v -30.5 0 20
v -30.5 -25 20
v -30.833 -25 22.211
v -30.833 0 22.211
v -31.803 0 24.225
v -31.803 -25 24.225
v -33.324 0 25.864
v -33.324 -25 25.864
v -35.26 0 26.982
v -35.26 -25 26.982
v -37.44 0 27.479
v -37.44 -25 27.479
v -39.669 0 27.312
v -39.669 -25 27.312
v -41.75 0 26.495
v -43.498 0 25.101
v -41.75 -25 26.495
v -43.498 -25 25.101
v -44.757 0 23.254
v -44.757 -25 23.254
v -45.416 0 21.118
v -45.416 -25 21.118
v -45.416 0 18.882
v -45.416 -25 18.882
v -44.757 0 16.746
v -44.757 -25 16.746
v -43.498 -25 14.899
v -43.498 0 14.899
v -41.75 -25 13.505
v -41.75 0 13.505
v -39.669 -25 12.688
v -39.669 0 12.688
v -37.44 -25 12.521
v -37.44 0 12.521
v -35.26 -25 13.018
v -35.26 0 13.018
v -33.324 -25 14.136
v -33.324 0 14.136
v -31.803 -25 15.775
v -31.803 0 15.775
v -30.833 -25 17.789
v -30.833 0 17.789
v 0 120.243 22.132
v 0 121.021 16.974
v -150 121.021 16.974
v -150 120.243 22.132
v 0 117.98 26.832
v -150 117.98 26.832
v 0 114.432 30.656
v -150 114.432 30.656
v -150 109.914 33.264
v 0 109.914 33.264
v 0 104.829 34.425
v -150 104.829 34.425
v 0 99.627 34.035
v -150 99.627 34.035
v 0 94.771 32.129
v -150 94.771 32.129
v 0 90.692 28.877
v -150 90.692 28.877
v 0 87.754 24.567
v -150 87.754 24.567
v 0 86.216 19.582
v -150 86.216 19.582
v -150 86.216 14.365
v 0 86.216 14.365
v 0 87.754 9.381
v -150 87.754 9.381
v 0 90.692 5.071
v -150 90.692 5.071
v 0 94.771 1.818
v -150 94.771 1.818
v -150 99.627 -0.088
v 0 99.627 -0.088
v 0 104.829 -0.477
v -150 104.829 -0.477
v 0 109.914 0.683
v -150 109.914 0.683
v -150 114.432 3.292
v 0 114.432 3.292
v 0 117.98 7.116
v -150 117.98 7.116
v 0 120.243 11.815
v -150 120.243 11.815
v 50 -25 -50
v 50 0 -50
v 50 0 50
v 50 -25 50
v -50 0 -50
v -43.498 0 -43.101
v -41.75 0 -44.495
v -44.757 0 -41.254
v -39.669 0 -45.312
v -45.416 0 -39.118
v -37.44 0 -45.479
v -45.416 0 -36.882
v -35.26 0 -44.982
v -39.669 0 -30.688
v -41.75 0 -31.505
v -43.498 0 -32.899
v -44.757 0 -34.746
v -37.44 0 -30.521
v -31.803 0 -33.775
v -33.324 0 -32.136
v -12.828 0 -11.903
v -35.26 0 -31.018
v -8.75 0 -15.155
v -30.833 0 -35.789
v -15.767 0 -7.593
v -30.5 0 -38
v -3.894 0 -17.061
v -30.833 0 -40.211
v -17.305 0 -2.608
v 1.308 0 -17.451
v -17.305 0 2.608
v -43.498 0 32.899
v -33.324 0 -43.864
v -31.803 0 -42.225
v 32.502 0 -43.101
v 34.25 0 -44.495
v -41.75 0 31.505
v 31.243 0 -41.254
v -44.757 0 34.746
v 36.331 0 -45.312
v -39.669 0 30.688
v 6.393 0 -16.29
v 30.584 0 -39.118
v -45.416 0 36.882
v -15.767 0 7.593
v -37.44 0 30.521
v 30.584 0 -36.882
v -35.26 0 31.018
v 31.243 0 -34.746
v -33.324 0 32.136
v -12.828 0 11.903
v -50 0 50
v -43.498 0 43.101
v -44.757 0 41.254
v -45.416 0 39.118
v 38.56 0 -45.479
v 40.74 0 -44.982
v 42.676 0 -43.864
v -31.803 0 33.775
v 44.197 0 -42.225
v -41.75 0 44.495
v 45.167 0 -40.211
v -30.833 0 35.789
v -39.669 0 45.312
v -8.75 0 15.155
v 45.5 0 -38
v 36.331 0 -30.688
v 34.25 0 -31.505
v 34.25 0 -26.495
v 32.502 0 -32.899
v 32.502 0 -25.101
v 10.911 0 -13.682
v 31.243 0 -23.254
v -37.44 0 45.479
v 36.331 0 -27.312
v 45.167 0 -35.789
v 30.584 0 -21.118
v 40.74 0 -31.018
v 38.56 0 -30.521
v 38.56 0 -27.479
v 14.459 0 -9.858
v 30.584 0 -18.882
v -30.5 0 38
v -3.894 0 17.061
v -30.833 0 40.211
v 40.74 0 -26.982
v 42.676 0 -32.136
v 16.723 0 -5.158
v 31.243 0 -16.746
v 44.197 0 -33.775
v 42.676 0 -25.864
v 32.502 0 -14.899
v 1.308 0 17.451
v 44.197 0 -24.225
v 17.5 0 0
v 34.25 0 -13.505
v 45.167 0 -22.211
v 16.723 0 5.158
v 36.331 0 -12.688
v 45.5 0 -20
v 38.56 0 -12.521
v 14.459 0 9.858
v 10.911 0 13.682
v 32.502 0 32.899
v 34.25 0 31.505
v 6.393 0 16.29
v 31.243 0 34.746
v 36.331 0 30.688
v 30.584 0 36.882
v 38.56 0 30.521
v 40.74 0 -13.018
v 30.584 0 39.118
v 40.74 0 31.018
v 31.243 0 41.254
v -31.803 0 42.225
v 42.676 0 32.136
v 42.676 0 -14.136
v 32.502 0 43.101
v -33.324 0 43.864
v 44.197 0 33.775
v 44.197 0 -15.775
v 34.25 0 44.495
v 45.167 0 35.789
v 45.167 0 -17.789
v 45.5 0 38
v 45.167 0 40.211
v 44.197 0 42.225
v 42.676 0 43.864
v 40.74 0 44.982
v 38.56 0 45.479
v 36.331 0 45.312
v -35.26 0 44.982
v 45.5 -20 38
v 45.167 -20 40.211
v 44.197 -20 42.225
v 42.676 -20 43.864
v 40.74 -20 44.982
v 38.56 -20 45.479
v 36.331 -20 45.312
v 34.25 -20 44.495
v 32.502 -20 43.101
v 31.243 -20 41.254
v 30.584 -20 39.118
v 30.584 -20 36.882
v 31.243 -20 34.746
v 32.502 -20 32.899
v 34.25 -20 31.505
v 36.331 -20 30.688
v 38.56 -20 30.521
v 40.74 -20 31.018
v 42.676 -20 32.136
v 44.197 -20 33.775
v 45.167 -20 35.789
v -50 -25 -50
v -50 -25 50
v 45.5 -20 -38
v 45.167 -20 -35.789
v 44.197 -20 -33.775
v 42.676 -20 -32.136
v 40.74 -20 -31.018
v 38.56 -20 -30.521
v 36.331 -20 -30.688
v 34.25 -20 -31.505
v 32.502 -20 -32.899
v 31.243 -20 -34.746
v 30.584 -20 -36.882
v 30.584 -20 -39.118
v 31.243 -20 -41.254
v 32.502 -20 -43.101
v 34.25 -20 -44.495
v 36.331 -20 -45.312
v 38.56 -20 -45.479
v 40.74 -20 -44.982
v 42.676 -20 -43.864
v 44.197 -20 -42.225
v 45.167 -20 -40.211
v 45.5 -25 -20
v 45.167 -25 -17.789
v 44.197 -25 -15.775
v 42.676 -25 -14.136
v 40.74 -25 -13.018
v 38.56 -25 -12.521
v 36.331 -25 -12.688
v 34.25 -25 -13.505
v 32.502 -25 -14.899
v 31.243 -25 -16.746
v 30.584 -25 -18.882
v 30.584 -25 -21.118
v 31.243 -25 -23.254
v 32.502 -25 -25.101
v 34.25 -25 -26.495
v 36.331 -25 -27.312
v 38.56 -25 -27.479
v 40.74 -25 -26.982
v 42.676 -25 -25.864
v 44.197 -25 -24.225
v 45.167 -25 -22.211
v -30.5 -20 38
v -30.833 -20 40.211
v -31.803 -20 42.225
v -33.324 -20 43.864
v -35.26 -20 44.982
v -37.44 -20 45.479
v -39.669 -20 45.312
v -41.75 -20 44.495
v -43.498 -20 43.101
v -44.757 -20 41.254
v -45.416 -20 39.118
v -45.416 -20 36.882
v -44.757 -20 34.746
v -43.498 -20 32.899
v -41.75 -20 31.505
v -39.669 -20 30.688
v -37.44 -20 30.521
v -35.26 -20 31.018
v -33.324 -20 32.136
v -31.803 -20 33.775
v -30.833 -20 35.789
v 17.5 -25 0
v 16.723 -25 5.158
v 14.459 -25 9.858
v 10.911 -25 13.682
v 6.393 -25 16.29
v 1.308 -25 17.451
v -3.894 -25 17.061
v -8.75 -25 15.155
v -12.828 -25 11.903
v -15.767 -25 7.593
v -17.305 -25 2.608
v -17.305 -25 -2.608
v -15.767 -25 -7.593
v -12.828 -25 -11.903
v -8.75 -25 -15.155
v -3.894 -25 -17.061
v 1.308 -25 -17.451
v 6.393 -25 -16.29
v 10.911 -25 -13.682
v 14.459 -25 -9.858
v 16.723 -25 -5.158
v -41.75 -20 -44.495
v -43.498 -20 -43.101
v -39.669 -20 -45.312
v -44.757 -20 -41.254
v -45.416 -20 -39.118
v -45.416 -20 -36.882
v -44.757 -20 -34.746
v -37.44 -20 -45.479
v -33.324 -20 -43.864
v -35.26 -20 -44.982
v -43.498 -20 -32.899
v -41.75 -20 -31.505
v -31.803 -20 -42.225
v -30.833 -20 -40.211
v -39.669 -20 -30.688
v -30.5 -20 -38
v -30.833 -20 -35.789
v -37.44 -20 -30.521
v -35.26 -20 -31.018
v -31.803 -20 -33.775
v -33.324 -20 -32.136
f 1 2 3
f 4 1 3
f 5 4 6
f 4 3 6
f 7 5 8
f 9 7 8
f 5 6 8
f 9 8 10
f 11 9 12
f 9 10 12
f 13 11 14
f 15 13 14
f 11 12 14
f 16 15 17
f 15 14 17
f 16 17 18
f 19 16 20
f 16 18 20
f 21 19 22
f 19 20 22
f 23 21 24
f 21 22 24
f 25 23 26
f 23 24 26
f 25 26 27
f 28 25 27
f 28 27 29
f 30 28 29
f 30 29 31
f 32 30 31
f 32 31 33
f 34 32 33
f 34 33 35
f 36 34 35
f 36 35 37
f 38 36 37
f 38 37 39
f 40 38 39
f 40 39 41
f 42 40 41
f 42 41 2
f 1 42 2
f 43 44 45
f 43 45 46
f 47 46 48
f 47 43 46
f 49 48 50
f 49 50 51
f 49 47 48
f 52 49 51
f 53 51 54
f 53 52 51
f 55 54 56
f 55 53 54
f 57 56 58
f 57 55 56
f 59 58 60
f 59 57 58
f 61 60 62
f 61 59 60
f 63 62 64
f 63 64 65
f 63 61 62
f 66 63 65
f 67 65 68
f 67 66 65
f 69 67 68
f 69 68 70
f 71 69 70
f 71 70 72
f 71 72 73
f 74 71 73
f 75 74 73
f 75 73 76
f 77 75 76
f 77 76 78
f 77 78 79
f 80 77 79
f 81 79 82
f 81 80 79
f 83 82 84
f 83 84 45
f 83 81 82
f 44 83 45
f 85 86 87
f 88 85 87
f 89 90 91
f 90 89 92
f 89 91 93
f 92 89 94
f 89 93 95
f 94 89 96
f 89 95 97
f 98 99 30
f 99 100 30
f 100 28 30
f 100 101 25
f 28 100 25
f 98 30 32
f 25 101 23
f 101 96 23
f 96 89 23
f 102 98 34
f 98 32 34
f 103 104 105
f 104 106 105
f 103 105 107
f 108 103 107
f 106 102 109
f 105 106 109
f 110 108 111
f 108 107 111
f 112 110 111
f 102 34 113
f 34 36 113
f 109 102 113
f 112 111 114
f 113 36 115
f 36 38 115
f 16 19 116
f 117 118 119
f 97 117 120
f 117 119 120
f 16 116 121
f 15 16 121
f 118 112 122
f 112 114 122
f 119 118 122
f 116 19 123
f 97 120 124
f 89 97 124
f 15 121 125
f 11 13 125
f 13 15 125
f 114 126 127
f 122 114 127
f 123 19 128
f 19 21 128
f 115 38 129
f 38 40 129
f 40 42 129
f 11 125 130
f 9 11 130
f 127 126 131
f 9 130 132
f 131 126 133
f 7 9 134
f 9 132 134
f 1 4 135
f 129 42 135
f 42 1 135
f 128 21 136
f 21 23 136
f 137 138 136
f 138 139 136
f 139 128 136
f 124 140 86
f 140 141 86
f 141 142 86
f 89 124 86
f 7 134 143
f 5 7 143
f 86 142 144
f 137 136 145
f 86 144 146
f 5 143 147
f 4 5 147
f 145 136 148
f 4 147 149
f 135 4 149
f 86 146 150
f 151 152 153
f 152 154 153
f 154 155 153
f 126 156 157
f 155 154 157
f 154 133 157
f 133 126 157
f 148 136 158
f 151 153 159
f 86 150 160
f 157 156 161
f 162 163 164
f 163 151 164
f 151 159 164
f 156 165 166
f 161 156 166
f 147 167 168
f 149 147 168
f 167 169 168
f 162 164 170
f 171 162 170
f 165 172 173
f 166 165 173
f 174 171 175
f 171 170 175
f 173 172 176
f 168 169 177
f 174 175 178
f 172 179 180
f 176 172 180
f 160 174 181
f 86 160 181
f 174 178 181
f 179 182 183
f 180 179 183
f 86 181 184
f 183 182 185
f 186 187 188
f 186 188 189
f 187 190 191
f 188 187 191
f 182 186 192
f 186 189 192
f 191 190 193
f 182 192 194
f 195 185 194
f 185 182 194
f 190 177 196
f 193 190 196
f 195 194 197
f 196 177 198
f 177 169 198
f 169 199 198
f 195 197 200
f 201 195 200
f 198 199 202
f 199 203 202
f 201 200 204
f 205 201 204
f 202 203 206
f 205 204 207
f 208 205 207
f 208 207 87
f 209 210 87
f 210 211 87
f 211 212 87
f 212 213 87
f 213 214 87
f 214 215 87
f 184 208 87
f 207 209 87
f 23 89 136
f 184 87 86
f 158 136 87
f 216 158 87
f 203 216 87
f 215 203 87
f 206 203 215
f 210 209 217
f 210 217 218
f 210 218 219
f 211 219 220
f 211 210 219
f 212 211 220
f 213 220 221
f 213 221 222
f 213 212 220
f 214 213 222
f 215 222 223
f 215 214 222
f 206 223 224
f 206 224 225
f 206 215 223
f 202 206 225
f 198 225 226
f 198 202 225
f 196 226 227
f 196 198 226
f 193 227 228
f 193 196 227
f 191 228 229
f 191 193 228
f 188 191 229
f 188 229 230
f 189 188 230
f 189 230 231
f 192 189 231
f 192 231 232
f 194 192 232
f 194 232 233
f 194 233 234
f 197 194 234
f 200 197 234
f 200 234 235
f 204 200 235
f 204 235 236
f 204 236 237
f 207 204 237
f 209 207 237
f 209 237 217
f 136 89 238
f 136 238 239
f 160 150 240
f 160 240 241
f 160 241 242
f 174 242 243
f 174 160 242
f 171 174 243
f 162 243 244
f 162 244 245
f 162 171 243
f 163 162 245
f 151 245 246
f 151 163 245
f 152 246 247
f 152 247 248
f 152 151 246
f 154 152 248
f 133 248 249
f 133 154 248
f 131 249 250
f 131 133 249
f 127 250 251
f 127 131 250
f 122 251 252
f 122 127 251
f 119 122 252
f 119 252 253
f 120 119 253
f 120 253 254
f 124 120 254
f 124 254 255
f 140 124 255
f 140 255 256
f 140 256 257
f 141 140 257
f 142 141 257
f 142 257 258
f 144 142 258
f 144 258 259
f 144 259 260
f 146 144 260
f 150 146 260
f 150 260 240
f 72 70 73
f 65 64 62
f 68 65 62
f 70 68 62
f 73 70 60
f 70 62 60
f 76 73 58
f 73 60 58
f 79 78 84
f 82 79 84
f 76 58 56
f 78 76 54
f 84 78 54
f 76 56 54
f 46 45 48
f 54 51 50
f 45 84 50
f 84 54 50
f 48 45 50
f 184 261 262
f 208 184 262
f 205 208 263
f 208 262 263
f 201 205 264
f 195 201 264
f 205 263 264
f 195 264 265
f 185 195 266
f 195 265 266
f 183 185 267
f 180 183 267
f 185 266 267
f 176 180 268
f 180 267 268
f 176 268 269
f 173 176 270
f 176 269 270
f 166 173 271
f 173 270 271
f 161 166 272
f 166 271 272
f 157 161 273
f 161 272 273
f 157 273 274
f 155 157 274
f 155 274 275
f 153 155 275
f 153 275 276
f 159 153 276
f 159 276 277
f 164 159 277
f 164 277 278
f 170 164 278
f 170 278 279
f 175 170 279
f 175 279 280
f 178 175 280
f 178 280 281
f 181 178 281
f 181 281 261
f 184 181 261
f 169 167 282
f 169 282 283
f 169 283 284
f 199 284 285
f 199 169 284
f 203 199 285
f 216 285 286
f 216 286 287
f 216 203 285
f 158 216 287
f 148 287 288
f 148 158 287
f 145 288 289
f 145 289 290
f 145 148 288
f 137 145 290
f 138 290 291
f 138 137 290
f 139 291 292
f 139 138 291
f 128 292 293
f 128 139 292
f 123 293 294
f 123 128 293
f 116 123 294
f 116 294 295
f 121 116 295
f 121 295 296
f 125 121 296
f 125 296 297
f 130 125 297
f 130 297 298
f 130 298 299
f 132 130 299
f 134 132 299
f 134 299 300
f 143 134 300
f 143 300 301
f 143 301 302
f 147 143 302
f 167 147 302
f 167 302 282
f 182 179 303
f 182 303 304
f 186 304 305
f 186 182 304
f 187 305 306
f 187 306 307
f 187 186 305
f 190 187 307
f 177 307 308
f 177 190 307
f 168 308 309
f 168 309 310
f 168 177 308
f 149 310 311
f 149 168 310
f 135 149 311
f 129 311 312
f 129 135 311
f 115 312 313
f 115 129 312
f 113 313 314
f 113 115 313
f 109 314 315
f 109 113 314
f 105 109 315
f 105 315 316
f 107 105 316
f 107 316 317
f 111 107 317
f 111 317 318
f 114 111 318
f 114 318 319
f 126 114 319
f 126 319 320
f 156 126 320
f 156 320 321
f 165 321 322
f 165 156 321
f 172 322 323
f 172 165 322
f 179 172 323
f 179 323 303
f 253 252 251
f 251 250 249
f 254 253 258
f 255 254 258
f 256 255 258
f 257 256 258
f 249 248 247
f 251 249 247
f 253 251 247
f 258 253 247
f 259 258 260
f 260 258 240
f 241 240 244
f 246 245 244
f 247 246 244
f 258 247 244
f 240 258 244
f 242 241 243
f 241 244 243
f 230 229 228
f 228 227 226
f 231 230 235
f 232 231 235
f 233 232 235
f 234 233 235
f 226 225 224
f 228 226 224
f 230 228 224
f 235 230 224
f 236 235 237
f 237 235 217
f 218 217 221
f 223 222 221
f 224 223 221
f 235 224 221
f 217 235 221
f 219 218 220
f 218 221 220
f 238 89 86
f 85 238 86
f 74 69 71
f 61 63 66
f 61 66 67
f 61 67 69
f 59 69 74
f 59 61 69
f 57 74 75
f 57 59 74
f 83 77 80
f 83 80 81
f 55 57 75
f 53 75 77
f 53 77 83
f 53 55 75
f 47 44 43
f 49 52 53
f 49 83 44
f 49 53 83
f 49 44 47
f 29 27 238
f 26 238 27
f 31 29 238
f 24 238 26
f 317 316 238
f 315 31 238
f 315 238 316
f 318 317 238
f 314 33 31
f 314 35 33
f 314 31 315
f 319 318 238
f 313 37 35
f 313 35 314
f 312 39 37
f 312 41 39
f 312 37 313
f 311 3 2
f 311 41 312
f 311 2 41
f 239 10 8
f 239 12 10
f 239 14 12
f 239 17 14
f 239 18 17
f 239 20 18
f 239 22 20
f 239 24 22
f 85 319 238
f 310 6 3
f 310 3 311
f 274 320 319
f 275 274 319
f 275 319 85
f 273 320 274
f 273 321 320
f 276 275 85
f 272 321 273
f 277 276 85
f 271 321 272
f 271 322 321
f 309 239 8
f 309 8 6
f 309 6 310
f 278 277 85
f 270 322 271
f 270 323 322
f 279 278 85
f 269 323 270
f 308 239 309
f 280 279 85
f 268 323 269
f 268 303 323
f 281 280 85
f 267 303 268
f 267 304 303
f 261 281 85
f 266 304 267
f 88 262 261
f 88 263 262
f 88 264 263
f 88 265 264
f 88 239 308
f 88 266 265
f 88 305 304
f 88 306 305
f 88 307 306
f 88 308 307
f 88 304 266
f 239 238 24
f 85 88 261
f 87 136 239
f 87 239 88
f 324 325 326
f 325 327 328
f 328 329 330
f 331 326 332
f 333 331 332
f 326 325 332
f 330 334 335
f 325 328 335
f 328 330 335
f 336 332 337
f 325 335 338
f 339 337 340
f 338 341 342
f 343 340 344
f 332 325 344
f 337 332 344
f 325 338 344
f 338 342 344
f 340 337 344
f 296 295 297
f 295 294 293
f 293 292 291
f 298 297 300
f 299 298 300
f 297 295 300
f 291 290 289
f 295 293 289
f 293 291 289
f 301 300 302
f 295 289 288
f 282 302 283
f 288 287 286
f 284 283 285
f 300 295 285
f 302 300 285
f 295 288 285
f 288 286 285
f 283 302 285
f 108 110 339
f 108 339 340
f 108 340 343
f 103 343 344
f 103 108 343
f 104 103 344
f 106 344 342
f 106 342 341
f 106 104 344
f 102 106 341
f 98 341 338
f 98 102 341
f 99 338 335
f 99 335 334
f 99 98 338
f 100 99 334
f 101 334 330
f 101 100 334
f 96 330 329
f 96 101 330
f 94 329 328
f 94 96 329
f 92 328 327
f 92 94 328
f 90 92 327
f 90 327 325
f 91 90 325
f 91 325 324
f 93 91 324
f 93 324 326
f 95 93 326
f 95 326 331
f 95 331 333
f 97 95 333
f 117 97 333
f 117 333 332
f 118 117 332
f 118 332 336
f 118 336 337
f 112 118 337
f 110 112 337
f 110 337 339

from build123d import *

# Parameters (mm, degrees)
F0_W     = 100
F0_H     = 100
F0_R     = 7.5
F0_R_2   = 17.5
F1_DEPTH = 25
F2_R     = 17.5
F3_DEPTH = 150
F4_R     = 7.5
F5_DEPTH = 5
F6_R     = 7.5
F7_DEPTH = 146.0218702087


with BuildPart() as f1:
    # F0 (on Front) → F1 (new body)
    with BuildSketch(Plane.XZ):
        Rectangle(F0_W, F0_H)
        with Locations((-38, -38)):
            Circle(F0_R, mode=Mode.SUBTRACT)
        with Locations((38, -38)):
            Circle(F0_R, mode=Mode.SUBTRACT)
        with Locations((-38, 38)):
            Circle(F0_R, mode=Mode.SUBTRACT)
        Circle(F0_R_2, mode=Mode.SUBTRACT)
        with Locations((38, 38)):
            Circle(F0_R, mode=Mode.SUBTRACT)
    extrude(amount=F1_DEPTH)

    # F4 (on face) → F5 (join)
    with BuildSketch(Plane.XZ.offset(25)):
        with Locations((-38, 38)):
            Circle(F4_R)
        with Locations((38, 38)):
            Circle(F4_R)
        with Locations((38, -38)):
            Circle(F4_R)
        with Locations((-38, -38)):
            Circle(F4_R)
    extrude(amount=-F5_DEPTH)

    # F6 (on face) → F7 (cut, through all)
    with BuildSketch(Plane.XZ.offset(25)):
        with Locations((-38, 20)):
            Circle(F6_R)
        with Locations((38, -20)):
            Circle(F6_R)
    extrude(amount=-F7_DEPTH, mode=Mode.SUBTRACT)


with BuildPart() as f3:
    # F2 (on Right) → F3 (new body)
    with BuildSketch(Plane.YZ):
        with Locations((103.5208702087, 16.9736910611)):
            Circle(F2_R)
    extrude(amount=-F3_DEPTH)


solid = Compound([f1.part, f3.part])
